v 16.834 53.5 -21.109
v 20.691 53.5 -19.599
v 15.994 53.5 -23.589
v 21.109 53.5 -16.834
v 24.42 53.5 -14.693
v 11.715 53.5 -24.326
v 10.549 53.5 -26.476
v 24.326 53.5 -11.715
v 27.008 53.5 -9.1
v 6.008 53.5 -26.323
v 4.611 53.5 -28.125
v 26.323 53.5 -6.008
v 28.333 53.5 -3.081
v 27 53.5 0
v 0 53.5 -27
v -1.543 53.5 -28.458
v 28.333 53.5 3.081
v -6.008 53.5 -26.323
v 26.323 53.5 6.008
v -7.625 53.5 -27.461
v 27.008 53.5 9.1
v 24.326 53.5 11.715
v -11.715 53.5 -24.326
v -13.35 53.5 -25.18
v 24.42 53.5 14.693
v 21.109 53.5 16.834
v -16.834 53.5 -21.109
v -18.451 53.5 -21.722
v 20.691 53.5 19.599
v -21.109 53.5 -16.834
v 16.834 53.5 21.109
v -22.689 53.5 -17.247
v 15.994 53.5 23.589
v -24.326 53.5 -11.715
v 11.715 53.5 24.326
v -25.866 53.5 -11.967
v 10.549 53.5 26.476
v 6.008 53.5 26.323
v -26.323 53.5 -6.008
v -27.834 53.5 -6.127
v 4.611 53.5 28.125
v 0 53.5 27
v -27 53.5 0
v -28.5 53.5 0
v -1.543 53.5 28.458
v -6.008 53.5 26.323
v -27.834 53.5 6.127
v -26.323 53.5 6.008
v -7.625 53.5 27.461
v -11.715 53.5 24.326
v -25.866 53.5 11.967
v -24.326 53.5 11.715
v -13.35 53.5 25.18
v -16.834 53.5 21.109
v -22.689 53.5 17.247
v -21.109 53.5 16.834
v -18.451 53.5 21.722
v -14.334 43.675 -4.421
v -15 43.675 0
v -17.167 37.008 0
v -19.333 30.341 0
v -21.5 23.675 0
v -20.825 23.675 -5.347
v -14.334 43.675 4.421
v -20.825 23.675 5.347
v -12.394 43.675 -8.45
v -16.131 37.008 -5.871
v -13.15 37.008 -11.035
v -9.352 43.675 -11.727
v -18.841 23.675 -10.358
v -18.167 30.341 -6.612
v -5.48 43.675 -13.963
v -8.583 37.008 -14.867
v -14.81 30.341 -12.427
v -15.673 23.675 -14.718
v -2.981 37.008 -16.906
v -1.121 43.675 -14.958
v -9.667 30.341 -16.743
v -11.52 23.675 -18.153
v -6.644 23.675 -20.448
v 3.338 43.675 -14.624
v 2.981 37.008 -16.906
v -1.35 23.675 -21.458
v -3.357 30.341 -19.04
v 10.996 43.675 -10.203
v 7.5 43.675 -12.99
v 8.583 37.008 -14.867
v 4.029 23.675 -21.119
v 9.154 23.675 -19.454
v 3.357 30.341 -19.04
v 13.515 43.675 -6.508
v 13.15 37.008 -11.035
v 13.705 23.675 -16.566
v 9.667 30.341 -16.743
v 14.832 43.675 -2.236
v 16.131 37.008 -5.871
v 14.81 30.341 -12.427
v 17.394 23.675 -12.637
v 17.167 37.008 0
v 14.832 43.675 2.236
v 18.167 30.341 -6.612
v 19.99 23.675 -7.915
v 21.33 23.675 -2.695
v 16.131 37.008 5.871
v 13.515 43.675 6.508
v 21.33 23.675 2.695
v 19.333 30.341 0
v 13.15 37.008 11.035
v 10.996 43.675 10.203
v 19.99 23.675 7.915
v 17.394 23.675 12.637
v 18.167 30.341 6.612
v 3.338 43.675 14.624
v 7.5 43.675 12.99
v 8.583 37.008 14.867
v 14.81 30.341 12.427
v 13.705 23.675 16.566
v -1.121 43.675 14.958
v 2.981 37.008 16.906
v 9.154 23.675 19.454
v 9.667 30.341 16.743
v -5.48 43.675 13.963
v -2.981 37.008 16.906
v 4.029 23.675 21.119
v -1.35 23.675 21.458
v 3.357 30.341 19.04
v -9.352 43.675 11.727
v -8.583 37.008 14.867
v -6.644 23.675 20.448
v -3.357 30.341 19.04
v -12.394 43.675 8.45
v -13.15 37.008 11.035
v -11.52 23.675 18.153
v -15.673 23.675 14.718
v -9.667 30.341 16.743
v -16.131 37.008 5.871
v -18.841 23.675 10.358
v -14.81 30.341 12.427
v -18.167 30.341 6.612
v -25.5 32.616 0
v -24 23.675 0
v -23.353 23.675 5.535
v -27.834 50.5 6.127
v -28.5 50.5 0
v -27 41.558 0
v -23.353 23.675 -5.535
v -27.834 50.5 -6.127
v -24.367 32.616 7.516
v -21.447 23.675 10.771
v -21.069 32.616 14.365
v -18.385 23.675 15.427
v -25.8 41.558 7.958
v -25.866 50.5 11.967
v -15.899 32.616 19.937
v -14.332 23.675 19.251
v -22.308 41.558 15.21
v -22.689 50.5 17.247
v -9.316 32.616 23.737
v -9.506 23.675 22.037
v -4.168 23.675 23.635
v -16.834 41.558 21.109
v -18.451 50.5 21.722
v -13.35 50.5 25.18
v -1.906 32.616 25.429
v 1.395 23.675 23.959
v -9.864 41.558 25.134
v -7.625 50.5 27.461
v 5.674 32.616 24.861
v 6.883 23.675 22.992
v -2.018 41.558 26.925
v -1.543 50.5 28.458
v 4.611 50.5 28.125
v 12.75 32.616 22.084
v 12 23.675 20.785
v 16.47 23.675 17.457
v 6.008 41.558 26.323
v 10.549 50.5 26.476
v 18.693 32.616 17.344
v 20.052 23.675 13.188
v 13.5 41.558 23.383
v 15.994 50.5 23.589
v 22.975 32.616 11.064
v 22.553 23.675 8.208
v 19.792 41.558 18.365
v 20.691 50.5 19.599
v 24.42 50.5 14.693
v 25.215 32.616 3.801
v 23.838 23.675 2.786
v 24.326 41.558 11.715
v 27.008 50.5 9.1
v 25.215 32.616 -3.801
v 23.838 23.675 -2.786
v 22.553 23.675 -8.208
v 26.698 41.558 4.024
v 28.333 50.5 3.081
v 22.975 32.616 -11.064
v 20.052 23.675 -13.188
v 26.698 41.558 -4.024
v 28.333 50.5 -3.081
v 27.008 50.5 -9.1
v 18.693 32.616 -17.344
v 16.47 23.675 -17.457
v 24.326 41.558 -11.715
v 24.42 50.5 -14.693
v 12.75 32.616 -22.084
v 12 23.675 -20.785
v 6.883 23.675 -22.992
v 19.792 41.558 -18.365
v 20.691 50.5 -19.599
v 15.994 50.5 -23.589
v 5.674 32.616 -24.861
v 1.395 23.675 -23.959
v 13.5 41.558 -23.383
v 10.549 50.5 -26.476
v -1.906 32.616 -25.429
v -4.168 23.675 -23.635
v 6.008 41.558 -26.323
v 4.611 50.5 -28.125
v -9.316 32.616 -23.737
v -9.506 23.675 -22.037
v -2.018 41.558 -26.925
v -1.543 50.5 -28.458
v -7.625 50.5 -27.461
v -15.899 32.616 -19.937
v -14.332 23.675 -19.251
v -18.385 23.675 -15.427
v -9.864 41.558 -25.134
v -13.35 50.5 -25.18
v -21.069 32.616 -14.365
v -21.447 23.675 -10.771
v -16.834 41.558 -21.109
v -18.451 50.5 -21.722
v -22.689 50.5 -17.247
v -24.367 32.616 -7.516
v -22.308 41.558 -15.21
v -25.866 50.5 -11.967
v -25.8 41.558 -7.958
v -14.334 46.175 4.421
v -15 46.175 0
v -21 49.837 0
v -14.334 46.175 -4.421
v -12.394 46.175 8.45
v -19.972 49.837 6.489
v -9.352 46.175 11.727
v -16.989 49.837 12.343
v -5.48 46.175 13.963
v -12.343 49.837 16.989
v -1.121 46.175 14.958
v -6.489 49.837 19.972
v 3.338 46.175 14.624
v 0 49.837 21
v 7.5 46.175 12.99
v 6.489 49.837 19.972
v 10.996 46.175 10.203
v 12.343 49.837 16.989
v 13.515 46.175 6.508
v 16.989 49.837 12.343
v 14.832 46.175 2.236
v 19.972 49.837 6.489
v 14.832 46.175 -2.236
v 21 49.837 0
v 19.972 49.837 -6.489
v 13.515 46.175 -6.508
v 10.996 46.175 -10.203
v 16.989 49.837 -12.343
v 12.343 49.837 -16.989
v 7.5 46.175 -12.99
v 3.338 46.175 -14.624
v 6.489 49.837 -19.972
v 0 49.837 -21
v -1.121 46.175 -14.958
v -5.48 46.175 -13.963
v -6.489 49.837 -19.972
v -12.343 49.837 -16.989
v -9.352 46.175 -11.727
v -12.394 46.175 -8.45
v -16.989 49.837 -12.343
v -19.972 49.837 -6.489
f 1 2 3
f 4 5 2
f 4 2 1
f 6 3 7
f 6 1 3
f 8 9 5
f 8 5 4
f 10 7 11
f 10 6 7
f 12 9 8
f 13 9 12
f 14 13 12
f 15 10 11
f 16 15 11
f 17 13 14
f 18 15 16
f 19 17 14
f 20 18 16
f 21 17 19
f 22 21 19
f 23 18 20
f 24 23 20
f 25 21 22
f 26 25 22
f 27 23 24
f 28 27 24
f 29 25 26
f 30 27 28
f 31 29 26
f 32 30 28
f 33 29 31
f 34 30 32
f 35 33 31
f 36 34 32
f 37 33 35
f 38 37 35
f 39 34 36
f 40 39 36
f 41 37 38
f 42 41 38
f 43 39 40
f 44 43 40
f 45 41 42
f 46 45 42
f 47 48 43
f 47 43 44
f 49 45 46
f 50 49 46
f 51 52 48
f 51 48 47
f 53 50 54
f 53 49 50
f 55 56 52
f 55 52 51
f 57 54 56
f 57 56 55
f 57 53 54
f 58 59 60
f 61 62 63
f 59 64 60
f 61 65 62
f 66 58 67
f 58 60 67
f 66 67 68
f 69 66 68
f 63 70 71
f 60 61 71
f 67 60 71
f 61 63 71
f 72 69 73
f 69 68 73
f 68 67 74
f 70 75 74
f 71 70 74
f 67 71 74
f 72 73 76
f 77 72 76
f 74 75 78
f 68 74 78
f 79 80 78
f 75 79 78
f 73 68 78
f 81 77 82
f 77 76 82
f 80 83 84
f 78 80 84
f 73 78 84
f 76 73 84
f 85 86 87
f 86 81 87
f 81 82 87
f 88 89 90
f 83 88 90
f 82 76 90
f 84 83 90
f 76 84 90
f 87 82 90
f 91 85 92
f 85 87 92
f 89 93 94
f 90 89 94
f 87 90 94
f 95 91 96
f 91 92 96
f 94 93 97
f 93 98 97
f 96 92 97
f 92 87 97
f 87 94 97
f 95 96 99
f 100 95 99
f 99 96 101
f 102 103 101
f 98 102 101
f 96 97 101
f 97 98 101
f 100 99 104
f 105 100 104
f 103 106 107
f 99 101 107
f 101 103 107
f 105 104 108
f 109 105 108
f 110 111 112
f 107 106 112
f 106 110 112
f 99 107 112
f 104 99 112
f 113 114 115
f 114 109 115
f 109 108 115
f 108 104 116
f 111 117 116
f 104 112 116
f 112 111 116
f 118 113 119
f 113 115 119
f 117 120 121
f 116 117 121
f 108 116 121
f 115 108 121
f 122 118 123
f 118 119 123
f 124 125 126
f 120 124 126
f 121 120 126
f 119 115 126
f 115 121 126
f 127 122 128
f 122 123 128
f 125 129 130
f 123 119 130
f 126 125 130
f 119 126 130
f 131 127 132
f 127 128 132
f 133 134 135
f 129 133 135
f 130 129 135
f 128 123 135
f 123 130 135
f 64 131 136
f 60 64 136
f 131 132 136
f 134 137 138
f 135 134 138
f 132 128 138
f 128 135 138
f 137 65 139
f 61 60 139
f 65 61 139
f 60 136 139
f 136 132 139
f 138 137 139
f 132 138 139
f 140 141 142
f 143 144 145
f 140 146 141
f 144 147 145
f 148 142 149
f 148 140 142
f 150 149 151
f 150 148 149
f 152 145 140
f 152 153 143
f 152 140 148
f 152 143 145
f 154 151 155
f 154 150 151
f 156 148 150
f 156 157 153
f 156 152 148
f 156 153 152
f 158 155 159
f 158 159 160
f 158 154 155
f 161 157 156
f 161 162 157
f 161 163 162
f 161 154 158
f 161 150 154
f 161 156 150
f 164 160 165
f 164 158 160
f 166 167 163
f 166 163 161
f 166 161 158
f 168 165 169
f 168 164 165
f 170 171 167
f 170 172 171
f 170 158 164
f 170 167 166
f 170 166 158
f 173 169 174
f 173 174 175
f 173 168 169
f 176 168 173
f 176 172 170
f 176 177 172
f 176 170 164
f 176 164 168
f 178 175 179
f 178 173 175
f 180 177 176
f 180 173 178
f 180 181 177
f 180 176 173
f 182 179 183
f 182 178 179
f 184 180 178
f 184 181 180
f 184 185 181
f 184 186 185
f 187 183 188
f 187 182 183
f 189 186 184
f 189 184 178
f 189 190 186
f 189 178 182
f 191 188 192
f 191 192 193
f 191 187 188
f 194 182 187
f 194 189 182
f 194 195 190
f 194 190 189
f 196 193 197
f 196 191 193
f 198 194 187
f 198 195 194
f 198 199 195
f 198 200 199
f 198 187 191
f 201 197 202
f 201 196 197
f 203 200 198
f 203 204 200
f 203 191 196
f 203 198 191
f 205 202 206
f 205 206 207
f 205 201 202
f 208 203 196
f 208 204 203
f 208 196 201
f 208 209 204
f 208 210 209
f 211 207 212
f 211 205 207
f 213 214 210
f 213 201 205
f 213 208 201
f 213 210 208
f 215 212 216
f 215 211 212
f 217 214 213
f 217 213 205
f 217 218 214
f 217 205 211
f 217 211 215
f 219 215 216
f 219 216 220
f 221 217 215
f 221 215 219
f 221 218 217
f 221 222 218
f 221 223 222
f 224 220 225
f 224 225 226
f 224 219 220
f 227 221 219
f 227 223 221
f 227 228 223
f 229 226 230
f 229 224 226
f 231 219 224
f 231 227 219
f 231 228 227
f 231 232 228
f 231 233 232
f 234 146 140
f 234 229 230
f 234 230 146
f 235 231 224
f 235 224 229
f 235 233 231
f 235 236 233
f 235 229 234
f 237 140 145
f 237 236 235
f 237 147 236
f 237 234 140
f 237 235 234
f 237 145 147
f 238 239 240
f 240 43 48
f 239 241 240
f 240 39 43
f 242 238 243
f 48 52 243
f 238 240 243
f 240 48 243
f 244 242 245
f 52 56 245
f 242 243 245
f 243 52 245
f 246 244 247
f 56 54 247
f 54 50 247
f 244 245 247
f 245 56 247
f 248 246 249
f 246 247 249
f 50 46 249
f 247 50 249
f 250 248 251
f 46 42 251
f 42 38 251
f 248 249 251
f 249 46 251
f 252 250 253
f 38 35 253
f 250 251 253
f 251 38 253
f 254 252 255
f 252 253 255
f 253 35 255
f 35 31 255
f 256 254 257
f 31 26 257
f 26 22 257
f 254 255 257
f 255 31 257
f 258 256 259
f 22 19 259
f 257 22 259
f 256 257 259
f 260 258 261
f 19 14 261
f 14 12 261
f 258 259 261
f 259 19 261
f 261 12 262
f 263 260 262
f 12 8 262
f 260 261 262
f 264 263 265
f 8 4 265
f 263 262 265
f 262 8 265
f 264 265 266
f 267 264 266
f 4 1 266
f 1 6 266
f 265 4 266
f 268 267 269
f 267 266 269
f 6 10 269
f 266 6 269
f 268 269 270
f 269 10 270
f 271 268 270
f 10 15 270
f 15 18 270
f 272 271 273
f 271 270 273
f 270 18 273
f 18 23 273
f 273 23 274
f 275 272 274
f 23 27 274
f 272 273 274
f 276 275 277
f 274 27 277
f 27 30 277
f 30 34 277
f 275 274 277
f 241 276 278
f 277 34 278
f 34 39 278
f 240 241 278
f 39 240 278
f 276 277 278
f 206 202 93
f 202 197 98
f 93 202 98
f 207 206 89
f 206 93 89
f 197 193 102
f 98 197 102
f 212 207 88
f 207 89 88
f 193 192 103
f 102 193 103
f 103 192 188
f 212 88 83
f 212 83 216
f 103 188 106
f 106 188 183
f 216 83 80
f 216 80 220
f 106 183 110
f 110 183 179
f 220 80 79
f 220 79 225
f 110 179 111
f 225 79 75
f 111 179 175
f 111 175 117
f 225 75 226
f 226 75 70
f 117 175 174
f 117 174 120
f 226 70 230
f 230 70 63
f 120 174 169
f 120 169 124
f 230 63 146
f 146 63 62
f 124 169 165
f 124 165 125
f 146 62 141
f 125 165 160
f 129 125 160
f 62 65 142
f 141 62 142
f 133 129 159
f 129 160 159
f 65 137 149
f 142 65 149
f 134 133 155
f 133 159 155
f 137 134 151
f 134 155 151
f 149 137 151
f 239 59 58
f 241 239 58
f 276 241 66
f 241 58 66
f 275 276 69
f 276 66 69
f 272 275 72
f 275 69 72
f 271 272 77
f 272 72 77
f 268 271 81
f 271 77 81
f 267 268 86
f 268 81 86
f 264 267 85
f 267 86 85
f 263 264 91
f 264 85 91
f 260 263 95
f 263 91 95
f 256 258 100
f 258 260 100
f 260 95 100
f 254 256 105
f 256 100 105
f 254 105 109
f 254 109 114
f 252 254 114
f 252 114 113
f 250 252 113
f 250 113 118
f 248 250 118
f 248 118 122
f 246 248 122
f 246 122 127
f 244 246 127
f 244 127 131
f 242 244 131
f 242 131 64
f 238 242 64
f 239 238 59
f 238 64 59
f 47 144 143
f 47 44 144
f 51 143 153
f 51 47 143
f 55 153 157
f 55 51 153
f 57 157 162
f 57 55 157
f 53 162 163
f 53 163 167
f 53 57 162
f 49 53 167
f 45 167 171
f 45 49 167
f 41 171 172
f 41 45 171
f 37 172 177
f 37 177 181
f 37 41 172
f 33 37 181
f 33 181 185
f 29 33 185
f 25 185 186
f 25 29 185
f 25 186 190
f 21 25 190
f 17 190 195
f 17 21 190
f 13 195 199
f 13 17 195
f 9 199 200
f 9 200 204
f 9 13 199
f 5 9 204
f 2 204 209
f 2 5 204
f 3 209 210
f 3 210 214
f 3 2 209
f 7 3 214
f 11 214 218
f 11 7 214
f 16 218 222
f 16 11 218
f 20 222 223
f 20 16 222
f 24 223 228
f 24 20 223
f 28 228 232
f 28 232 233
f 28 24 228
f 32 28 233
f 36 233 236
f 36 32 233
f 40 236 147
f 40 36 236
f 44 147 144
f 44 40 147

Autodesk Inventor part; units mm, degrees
ref_plane "YZ Plane" through (0, 0, 0) normal (1, 0, 0) x (0, 1, 0)
ref_plane "XZ Plane" through (0, 0, 0) normal (0, 1, 0) x (-1, 0, 0)
ref_plane "XY Plane" through (0, 0, 0) normal (0, 0, 1) x (1, 0, 0)
sketch "Boceto1" plane through (0, 0, 0) normal (0, 0, 1) x (1, 0, 0)
  line L0 (-24, 23.6746) -> (-21.5, 23.6746)
  line L1 (-28.5, 50.5) -> (-24, 23.6746)
  line L2 (-28.5, 50.5) -> (-28.5, 53.5)
  line L3 (-28.5, 53.5) -> (-27, 53.5)
  line L4 (-27, 53.5) -> (-15, 46.1746)
  line L5 (-15, 46.1746) -> (-15, 43.6746)
  line L6 (-15, 43.6746) -> (-21.5, 23.6746)
  line L7 (0, -10.7) -> (0, 64.2) projected
  point P0 (0, 0)
  dimension "d5" = 2.5
  dimension "d6" = 4.5
  dimension "d7" = 3
  dimension "d8" = 1.5
  dimension "d9" = 12
  dimension "d10" = 2.5
  dimension "d11" = 20
revolve "Revolución1" add sketch "Boceto1" angle 360 about axis through (0, -10, 0) along (0, 1, 0)
properties part number "GRAFITO"
